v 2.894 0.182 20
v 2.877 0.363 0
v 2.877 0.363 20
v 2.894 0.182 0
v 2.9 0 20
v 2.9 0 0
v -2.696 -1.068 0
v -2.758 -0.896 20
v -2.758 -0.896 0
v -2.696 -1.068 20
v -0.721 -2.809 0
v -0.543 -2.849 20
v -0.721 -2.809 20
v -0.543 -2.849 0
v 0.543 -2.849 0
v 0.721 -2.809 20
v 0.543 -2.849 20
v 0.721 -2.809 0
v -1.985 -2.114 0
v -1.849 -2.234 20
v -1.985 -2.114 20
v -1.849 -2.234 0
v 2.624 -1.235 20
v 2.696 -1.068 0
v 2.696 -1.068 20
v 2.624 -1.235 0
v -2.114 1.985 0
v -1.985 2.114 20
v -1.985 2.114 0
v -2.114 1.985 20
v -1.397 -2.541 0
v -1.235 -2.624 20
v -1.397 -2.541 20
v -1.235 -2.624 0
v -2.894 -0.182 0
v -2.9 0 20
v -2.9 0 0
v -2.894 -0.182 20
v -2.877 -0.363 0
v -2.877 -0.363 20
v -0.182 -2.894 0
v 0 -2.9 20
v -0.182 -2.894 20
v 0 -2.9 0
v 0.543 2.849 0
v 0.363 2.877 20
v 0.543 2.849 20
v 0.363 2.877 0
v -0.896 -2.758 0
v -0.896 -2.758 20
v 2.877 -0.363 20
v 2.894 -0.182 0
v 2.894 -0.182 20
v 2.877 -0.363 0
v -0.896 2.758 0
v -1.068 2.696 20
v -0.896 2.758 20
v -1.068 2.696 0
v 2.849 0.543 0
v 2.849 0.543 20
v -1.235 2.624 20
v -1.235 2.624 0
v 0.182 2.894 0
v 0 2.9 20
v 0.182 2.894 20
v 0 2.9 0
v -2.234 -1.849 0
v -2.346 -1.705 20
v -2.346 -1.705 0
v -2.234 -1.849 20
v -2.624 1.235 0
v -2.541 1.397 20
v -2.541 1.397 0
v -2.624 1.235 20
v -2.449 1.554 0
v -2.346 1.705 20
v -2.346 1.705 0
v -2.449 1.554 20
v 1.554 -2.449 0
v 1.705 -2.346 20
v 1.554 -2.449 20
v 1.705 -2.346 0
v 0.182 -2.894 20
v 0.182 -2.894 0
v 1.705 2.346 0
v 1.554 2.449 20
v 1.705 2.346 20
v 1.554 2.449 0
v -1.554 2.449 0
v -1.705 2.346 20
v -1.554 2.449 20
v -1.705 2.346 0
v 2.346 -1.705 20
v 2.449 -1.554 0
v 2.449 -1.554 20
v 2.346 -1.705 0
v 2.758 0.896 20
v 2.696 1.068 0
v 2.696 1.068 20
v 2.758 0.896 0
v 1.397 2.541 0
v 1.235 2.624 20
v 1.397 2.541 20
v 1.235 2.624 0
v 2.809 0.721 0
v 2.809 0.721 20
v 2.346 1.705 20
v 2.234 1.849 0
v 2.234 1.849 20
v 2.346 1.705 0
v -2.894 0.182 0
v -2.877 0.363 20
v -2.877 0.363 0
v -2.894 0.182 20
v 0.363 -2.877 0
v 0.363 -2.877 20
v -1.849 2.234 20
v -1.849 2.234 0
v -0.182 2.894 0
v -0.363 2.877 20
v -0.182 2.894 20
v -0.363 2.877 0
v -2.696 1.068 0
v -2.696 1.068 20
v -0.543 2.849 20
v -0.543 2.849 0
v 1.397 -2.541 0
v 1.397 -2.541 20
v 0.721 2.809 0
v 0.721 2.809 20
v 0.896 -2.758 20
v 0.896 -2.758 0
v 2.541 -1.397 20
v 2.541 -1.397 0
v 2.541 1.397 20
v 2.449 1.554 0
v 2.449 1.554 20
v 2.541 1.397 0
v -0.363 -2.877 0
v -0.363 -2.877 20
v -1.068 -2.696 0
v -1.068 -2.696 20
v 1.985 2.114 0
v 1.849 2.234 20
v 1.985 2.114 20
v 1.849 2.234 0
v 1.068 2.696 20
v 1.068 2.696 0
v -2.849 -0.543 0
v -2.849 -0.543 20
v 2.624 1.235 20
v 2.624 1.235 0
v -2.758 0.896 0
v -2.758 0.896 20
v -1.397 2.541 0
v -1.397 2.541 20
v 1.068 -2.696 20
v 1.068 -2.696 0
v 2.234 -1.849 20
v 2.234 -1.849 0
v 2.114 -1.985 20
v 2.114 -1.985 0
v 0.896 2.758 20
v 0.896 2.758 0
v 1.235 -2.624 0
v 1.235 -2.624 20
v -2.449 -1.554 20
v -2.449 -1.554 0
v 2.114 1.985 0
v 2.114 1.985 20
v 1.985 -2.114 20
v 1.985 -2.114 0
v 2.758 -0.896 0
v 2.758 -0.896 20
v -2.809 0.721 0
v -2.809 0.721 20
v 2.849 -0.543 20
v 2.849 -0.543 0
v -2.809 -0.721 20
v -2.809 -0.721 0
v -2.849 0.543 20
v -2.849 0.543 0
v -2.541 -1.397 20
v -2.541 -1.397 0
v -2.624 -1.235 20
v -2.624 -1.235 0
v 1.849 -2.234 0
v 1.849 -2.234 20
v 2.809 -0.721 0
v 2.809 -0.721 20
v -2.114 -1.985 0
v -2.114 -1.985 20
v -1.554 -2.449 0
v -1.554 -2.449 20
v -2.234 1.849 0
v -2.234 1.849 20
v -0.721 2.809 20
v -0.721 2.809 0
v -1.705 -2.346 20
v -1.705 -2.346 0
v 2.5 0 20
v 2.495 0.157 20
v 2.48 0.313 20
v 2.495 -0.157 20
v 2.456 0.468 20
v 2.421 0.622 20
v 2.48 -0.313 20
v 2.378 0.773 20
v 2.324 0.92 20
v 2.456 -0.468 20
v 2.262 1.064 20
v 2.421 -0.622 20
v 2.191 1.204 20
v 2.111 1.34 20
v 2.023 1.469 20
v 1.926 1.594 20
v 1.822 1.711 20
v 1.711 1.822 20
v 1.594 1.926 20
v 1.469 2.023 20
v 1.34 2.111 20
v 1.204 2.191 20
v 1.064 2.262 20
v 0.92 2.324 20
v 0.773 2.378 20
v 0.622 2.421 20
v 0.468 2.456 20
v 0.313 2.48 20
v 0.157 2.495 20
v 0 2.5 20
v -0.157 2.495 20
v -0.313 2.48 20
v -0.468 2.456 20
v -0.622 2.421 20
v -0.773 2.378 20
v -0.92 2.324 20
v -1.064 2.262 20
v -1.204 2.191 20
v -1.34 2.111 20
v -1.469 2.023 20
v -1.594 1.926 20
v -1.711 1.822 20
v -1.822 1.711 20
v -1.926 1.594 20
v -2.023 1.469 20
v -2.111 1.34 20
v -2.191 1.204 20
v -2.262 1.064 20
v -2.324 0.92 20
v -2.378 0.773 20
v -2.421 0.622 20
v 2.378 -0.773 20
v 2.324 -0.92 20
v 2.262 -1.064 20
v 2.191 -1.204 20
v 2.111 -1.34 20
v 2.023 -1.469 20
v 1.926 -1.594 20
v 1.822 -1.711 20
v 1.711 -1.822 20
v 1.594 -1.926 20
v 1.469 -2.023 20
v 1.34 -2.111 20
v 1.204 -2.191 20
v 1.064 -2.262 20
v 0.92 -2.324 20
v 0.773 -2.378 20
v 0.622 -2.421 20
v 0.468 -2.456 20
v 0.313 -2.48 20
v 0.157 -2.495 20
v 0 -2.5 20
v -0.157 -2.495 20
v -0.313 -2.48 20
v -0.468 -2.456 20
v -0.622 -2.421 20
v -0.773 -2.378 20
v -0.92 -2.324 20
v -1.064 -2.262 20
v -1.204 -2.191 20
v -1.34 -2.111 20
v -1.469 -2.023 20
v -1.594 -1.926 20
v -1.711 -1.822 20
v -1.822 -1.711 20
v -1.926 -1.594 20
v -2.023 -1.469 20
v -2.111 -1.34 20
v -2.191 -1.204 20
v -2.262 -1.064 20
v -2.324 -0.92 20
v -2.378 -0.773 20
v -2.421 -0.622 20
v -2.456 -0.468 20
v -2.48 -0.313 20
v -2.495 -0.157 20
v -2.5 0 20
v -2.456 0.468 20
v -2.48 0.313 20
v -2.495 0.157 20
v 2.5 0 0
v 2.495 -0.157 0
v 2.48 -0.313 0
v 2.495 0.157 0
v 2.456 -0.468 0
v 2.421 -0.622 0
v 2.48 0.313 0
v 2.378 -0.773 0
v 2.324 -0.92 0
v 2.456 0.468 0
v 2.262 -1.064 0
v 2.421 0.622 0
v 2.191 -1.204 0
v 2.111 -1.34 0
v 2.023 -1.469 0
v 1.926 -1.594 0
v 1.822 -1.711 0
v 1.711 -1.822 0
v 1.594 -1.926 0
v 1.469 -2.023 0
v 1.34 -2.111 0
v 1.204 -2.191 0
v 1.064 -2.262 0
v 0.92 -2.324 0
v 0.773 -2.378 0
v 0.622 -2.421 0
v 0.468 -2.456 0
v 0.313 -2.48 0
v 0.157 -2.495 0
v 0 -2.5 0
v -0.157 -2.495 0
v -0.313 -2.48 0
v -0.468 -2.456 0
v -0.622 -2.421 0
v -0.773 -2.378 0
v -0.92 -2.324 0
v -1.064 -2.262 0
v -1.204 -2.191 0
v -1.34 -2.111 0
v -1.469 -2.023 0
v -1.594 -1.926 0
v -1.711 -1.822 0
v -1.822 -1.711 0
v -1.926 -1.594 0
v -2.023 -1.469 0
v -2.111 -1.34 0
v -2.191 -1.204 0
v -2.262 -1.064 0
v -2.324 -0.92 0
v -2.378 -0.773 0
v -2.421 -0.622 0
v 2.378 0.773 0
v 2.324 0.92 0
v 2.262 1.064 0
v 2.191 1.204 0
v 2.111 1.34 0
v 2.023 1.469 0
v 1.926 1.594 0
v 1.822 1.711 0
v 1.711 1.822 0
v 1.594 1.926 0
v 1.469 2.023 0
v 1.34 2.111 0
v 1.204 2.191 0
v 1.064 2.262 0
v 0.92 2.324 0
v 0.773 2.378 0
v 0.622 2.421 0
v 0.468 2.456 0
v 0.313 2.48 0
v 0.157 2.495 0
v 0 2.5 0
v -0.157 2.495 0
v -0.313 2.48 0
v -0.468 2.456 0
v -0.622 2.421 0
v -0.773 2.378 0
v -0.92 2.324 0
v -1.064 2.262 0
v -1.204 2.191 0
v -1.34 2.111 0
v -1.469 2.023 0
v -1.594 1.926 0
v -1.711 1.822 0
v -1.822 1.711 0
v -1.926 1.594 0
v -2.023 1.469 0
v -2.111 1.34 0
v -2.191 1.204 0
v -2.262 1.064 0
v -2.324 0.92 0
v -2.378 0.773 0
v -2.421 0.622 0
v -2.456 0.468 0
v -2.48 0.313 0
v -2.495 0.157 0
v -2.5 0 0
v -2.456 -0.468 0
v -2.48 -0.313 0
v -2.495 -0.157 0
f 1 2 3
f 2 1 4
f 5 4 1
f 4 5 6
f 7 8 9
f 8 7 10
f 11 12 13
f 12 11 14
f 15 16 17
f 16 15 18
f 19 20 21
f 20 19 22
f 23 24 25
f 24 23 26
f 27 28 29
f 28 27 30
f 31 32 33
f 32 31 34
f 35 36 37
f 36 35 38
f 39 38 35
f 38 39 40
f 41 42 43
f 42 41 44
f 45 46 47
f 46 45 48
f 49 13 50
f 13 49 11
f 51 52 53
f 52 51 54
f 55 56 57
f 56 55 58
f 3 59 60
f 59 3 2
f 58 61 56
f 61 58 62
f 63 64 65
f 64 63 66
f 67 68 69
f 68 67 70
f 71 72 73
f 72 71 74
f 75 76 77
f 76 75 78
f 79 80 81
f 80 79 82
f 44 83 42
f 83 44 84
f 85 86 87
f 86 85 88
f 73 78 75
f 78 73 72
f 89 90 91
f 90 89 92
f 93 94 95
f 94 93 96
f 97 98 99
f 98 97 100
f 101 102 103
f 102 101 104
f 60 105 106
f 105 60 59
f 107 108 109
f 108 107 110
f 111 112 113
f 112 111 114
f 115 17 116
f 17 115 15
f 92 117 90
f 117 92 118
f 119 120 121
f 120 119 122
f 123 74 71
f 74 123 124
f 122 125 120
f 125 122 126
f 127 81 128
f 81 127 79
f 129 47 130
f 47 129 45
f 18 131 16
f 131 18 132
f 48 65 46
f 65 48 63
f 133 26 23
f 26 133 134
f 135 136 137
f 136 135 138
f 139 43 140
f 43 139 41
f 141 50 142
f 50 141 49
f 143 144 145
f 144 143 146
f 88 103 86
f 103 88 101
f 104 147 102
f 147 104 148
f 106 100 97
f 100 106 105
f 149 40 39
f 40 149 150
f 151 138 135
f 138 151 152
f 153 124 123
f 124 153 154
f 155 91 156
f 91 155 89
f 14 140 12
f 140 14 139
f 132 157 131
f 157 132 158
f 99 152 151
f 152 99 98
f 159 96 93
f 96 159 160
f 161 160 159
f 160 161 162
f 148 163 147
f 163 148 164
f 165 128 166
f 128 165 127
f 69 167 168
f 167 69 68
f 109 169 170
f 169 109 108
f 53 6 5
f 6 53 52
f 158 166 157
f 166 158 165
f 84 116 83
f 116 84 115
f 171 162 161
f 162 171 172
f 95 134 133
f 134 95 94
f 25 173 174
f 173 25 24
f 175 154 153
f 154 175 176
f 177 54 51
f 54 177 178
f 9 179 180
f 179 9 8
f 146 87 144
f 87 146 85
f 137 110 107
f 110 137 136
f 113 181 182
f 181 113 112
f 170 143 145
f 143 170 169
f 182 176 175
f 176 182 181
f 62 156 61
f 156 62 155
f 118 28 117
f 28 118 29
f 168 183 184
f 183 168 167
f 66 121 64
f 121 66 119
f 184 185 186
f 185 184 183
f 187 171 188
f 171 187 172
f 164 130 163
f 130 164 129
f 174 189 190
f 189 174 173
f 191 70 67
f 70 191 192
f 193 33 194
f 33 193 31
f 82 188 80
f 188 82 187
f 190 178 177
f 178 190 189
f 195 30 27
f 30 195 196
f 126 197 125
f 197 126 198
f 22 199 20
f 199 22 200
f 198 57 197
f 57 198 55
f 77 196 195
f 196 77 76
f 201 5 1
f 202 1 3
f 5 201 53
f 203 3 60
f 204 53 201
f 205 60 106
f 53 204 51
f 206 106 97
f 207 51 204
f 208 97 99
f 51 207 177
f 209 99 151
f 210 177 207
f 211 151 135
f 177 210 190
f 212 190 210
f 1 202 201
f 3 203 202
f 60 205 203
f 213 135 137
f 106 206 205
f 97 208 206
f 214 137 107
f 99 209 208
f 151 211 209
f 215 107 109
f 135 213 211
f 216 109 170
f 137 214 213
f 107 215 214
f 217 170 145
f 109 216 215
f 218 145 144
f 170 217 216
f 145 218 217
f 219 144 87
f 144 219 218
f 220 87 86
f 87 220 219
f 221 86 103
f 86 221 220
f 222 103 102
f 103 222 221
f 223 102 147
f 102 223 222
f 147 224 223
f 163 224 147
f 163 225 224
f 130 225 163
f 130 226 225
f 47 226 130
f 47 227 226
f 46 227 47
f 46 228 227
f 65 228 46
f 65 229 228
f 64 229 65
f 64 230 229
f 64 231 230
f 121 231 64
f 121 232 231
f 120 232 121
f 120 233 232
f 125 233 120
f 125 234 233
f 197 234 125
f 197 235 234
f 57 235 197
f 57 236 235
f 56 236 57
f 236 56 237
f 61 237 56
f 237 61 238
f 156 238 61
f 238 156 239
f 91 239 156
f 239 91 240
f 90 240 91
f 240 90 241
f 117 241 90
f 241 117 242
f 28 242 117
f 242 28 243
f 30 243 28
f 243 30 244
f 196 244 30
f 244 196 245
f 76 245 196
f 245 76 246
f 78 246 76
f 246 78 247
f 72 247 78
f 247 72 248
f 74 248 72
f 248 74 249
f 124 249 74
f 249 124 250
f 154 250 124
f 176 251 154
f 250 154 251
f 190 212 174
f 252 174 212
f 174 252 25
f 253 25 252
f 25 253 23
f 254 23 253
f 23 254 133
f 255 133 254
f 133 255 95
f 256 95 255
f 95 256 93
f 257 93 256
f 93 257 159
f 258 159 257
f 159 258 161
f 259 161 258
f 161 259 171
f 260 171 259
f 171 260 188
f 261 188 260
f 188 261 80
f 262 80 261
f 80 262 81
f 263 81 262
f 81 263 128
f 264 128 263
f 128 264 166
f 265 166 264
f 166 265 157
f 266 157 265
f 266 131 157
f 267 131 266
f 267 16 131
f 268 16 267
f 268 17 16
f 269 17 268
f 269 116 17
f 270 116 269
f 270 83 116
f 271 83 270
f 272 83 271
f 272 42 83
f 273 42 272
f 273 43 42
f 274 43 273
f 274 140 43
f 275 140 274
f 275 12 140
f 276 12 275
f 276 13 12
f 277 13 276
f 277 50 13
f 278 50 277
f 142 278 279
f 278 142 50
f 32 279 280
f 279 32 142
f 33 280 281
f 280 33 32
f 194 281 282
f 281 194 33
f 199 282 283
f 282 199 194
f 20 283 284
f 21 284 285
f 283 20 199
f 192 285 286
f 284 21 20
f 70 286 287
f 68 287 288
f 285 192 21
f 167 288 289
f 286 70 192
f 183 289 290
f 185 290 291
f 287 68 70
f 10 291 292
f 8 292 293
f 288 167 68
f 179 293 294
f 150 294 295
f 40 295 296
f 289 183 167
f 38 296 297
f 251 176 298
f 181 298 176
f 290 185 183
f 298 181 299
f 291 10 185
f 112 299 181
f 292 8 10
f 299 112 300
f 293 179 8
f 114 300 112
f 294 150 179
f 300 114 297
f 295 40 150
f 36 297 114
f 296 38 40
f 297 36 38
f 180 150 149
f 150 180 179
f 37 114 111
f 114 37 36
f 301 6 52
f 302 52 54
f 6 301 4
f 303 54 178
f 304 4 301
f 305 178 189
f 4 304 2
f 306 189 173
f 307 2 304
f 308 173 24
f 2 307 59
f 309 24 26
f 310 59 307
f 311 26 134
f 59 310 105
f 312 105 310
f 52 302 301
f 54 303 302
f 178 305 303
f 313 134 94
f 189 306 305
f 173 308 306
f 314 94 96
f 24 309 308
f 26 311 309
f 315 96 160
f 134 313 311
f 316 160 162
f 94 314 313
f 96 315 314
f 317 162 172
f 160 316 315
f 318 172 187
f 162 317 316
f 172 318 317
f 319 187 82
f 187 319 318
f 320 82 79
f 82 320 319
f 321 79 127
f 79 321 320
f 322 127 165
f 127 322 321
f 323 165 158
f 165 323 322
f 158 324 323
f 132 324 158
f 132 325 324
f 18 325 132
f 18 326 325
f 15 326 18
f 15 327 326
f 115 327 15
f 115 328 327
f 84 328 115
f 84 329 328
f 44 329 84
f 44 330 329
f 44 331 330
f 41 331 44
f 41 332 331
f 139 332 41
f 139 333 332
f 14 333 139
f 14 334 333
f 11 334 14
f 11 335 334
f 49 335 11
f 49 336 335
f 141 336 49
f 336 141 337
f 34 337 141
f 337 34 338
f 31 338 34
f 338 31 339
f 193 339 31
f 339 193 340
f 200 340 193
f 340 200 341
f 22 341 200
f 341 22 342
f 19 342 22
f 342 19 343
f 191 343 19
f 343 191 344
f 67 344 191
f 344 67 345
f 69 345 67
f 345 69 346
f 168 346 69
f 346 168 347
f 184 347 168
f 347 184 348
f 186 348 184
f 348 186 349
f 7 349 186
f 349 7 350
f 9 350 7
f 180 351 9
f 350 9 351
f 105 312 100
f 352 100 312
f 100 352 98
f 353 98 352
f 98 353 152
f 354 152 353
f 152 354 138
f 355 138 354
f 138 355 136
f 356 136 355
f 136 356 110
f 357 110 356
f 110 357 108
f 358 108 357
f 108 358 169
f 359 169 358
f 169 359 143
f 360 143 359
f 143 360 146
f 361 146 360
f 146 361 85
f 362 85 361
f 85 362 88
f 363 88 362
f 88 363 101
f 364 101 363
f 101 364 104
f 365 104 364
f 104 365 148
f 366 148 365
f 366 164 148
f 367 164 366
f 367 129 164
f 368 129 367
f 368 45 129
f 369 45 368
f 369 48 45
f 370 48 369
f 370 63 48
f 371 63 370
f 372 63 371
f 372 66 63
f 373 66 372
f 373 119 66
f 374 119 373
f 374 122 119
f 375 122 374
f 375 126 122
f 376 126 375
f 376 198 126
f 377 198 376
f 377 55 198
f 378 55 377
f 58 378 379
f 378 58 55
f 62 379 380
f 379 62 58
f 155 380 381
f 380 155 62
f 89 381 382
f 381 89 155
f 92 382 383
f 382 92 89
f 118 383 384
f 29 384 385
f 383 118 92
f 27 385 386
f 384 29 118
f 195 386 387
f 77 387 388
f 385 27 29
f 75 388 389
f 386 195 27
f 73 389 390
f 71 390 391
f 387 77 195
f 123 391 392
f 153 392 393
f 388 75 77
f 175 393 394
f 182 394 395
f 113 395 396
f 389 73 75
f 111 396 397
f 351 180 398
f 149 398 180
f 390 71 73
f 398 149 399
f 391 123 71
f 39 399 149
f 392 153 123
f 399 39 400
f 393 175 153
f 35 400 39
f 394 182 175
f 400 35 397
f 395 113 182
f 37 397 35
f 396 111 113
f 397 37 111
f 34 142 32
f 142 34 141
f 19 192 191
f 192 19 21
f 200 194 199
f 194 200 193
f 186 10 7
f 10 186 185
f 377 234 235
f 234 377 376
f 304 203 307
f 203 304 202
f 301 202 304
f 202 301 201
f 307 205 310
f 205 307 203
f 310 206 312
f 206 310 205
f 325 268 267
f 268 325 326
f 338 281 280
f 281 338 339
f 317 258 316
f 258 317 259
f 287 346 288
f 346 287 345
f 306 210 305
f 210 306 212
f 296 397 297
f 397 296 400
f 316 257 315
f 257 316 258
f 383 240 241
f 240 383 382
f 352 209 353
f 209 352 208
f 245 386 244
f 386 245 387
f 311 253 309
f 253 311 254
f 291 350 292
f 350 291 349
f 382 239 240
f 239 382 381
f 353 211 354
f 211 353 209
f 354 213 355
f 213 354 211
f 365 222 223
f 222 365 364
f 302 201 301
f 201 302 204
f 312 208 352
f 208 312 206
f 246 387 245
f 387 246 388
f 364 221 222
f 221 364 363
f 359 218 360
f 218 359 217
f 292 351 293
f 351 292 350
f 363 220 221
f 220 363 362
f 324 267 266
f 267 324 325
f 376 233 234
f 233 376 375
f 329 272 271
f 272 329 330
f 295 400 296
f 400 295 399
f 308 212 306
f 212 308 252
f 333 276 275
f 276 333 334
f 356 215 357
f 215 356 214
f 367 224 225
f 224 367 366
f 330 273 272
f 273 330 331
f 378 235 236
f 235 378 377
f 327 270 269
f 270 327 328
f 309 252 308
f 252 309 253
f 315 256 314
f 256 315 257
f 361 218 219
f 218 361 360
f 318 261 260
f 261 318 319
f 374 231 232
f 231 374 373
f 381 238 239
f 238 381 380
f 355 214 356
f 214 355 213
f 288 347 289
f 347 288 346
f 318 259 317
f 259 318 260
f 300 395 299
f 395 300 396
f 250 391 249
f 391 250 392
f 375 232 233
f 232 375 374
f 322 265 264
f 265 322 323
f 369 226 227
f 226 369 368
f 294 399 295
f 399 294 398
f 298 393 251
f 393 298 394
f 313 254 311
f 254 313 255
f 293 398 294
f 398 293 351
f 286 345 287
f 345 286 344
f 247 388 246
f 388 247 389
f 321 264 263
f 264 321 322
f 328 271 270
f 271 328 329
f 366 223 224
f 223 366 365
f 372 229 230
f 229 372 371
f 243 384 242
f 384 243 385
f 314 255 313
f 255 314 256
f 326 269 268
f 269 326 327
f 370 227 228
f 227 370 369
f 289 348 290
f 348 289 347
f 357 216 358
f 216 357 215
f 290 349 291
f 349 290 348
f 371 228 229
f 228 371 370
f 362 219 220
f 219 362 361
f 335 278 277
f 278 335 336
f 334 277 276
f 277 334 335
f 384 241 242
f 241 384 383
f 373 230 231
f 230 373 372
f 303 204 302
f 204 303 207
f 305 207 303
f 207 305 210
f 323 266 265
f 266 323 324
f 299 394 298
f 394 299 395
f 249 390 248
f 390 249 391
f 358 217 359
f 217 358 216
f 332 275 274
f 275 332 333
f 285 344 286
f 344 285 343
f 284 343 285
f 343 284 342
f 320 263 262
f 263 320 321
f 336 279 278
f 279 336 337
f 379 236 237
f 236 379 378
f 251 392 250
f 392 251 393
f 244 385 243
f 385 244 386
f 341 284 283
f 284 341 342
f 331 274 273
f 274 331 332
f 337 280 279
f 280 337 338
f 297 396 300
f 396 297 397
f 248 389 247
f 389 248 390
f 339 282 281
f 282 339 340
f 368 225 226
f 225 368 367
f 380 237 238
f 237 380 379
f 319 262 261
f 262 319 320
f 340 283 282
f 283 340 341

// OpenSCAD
$fn = 100;

module part1() {
    difference() {
        cylinder(d=5.8, h=20);
        cylinder(d=5, h=20);
    }
}



module part3(){

    D1=41;
    d1=6; //6.4
    d2=9.6;
    h=1;
    
    difference(){
        union() {
            color("red") {
            rotate([0,0,45])
            rotate_extrude(angle = 90) 
                translate([20.5, 0, 00]) 
                    square(size = [ 10+1,1]);
            
           translate([-D1/2,0,0])
           cube([D1,D1/2, 1]);
           }
       }
       union(){
           color("green") {
           cylinder(d=D1,h=1);
           
           translate([-D1/2-10 + 4,0,0])
           cube([10,D1, 1]);
           
           translate([D1/2 - 4,0,0])
           cube([10,D1, 1]);
           

            rotate([0,0,0]) translate([0,D1/2+d2/2,0])
                cylinder(d=d2,h=1);
            rotate([0,0,-25]) translate([0,D1/2+d2/2,0])
                cylinder(d=d2, h=1);
            
            rotate([0,0,25]) translate([0,D1/2+d2/2,0])
                cylinder(d=d2, h=1);
           }
           
       }        
   }

}

part1();
